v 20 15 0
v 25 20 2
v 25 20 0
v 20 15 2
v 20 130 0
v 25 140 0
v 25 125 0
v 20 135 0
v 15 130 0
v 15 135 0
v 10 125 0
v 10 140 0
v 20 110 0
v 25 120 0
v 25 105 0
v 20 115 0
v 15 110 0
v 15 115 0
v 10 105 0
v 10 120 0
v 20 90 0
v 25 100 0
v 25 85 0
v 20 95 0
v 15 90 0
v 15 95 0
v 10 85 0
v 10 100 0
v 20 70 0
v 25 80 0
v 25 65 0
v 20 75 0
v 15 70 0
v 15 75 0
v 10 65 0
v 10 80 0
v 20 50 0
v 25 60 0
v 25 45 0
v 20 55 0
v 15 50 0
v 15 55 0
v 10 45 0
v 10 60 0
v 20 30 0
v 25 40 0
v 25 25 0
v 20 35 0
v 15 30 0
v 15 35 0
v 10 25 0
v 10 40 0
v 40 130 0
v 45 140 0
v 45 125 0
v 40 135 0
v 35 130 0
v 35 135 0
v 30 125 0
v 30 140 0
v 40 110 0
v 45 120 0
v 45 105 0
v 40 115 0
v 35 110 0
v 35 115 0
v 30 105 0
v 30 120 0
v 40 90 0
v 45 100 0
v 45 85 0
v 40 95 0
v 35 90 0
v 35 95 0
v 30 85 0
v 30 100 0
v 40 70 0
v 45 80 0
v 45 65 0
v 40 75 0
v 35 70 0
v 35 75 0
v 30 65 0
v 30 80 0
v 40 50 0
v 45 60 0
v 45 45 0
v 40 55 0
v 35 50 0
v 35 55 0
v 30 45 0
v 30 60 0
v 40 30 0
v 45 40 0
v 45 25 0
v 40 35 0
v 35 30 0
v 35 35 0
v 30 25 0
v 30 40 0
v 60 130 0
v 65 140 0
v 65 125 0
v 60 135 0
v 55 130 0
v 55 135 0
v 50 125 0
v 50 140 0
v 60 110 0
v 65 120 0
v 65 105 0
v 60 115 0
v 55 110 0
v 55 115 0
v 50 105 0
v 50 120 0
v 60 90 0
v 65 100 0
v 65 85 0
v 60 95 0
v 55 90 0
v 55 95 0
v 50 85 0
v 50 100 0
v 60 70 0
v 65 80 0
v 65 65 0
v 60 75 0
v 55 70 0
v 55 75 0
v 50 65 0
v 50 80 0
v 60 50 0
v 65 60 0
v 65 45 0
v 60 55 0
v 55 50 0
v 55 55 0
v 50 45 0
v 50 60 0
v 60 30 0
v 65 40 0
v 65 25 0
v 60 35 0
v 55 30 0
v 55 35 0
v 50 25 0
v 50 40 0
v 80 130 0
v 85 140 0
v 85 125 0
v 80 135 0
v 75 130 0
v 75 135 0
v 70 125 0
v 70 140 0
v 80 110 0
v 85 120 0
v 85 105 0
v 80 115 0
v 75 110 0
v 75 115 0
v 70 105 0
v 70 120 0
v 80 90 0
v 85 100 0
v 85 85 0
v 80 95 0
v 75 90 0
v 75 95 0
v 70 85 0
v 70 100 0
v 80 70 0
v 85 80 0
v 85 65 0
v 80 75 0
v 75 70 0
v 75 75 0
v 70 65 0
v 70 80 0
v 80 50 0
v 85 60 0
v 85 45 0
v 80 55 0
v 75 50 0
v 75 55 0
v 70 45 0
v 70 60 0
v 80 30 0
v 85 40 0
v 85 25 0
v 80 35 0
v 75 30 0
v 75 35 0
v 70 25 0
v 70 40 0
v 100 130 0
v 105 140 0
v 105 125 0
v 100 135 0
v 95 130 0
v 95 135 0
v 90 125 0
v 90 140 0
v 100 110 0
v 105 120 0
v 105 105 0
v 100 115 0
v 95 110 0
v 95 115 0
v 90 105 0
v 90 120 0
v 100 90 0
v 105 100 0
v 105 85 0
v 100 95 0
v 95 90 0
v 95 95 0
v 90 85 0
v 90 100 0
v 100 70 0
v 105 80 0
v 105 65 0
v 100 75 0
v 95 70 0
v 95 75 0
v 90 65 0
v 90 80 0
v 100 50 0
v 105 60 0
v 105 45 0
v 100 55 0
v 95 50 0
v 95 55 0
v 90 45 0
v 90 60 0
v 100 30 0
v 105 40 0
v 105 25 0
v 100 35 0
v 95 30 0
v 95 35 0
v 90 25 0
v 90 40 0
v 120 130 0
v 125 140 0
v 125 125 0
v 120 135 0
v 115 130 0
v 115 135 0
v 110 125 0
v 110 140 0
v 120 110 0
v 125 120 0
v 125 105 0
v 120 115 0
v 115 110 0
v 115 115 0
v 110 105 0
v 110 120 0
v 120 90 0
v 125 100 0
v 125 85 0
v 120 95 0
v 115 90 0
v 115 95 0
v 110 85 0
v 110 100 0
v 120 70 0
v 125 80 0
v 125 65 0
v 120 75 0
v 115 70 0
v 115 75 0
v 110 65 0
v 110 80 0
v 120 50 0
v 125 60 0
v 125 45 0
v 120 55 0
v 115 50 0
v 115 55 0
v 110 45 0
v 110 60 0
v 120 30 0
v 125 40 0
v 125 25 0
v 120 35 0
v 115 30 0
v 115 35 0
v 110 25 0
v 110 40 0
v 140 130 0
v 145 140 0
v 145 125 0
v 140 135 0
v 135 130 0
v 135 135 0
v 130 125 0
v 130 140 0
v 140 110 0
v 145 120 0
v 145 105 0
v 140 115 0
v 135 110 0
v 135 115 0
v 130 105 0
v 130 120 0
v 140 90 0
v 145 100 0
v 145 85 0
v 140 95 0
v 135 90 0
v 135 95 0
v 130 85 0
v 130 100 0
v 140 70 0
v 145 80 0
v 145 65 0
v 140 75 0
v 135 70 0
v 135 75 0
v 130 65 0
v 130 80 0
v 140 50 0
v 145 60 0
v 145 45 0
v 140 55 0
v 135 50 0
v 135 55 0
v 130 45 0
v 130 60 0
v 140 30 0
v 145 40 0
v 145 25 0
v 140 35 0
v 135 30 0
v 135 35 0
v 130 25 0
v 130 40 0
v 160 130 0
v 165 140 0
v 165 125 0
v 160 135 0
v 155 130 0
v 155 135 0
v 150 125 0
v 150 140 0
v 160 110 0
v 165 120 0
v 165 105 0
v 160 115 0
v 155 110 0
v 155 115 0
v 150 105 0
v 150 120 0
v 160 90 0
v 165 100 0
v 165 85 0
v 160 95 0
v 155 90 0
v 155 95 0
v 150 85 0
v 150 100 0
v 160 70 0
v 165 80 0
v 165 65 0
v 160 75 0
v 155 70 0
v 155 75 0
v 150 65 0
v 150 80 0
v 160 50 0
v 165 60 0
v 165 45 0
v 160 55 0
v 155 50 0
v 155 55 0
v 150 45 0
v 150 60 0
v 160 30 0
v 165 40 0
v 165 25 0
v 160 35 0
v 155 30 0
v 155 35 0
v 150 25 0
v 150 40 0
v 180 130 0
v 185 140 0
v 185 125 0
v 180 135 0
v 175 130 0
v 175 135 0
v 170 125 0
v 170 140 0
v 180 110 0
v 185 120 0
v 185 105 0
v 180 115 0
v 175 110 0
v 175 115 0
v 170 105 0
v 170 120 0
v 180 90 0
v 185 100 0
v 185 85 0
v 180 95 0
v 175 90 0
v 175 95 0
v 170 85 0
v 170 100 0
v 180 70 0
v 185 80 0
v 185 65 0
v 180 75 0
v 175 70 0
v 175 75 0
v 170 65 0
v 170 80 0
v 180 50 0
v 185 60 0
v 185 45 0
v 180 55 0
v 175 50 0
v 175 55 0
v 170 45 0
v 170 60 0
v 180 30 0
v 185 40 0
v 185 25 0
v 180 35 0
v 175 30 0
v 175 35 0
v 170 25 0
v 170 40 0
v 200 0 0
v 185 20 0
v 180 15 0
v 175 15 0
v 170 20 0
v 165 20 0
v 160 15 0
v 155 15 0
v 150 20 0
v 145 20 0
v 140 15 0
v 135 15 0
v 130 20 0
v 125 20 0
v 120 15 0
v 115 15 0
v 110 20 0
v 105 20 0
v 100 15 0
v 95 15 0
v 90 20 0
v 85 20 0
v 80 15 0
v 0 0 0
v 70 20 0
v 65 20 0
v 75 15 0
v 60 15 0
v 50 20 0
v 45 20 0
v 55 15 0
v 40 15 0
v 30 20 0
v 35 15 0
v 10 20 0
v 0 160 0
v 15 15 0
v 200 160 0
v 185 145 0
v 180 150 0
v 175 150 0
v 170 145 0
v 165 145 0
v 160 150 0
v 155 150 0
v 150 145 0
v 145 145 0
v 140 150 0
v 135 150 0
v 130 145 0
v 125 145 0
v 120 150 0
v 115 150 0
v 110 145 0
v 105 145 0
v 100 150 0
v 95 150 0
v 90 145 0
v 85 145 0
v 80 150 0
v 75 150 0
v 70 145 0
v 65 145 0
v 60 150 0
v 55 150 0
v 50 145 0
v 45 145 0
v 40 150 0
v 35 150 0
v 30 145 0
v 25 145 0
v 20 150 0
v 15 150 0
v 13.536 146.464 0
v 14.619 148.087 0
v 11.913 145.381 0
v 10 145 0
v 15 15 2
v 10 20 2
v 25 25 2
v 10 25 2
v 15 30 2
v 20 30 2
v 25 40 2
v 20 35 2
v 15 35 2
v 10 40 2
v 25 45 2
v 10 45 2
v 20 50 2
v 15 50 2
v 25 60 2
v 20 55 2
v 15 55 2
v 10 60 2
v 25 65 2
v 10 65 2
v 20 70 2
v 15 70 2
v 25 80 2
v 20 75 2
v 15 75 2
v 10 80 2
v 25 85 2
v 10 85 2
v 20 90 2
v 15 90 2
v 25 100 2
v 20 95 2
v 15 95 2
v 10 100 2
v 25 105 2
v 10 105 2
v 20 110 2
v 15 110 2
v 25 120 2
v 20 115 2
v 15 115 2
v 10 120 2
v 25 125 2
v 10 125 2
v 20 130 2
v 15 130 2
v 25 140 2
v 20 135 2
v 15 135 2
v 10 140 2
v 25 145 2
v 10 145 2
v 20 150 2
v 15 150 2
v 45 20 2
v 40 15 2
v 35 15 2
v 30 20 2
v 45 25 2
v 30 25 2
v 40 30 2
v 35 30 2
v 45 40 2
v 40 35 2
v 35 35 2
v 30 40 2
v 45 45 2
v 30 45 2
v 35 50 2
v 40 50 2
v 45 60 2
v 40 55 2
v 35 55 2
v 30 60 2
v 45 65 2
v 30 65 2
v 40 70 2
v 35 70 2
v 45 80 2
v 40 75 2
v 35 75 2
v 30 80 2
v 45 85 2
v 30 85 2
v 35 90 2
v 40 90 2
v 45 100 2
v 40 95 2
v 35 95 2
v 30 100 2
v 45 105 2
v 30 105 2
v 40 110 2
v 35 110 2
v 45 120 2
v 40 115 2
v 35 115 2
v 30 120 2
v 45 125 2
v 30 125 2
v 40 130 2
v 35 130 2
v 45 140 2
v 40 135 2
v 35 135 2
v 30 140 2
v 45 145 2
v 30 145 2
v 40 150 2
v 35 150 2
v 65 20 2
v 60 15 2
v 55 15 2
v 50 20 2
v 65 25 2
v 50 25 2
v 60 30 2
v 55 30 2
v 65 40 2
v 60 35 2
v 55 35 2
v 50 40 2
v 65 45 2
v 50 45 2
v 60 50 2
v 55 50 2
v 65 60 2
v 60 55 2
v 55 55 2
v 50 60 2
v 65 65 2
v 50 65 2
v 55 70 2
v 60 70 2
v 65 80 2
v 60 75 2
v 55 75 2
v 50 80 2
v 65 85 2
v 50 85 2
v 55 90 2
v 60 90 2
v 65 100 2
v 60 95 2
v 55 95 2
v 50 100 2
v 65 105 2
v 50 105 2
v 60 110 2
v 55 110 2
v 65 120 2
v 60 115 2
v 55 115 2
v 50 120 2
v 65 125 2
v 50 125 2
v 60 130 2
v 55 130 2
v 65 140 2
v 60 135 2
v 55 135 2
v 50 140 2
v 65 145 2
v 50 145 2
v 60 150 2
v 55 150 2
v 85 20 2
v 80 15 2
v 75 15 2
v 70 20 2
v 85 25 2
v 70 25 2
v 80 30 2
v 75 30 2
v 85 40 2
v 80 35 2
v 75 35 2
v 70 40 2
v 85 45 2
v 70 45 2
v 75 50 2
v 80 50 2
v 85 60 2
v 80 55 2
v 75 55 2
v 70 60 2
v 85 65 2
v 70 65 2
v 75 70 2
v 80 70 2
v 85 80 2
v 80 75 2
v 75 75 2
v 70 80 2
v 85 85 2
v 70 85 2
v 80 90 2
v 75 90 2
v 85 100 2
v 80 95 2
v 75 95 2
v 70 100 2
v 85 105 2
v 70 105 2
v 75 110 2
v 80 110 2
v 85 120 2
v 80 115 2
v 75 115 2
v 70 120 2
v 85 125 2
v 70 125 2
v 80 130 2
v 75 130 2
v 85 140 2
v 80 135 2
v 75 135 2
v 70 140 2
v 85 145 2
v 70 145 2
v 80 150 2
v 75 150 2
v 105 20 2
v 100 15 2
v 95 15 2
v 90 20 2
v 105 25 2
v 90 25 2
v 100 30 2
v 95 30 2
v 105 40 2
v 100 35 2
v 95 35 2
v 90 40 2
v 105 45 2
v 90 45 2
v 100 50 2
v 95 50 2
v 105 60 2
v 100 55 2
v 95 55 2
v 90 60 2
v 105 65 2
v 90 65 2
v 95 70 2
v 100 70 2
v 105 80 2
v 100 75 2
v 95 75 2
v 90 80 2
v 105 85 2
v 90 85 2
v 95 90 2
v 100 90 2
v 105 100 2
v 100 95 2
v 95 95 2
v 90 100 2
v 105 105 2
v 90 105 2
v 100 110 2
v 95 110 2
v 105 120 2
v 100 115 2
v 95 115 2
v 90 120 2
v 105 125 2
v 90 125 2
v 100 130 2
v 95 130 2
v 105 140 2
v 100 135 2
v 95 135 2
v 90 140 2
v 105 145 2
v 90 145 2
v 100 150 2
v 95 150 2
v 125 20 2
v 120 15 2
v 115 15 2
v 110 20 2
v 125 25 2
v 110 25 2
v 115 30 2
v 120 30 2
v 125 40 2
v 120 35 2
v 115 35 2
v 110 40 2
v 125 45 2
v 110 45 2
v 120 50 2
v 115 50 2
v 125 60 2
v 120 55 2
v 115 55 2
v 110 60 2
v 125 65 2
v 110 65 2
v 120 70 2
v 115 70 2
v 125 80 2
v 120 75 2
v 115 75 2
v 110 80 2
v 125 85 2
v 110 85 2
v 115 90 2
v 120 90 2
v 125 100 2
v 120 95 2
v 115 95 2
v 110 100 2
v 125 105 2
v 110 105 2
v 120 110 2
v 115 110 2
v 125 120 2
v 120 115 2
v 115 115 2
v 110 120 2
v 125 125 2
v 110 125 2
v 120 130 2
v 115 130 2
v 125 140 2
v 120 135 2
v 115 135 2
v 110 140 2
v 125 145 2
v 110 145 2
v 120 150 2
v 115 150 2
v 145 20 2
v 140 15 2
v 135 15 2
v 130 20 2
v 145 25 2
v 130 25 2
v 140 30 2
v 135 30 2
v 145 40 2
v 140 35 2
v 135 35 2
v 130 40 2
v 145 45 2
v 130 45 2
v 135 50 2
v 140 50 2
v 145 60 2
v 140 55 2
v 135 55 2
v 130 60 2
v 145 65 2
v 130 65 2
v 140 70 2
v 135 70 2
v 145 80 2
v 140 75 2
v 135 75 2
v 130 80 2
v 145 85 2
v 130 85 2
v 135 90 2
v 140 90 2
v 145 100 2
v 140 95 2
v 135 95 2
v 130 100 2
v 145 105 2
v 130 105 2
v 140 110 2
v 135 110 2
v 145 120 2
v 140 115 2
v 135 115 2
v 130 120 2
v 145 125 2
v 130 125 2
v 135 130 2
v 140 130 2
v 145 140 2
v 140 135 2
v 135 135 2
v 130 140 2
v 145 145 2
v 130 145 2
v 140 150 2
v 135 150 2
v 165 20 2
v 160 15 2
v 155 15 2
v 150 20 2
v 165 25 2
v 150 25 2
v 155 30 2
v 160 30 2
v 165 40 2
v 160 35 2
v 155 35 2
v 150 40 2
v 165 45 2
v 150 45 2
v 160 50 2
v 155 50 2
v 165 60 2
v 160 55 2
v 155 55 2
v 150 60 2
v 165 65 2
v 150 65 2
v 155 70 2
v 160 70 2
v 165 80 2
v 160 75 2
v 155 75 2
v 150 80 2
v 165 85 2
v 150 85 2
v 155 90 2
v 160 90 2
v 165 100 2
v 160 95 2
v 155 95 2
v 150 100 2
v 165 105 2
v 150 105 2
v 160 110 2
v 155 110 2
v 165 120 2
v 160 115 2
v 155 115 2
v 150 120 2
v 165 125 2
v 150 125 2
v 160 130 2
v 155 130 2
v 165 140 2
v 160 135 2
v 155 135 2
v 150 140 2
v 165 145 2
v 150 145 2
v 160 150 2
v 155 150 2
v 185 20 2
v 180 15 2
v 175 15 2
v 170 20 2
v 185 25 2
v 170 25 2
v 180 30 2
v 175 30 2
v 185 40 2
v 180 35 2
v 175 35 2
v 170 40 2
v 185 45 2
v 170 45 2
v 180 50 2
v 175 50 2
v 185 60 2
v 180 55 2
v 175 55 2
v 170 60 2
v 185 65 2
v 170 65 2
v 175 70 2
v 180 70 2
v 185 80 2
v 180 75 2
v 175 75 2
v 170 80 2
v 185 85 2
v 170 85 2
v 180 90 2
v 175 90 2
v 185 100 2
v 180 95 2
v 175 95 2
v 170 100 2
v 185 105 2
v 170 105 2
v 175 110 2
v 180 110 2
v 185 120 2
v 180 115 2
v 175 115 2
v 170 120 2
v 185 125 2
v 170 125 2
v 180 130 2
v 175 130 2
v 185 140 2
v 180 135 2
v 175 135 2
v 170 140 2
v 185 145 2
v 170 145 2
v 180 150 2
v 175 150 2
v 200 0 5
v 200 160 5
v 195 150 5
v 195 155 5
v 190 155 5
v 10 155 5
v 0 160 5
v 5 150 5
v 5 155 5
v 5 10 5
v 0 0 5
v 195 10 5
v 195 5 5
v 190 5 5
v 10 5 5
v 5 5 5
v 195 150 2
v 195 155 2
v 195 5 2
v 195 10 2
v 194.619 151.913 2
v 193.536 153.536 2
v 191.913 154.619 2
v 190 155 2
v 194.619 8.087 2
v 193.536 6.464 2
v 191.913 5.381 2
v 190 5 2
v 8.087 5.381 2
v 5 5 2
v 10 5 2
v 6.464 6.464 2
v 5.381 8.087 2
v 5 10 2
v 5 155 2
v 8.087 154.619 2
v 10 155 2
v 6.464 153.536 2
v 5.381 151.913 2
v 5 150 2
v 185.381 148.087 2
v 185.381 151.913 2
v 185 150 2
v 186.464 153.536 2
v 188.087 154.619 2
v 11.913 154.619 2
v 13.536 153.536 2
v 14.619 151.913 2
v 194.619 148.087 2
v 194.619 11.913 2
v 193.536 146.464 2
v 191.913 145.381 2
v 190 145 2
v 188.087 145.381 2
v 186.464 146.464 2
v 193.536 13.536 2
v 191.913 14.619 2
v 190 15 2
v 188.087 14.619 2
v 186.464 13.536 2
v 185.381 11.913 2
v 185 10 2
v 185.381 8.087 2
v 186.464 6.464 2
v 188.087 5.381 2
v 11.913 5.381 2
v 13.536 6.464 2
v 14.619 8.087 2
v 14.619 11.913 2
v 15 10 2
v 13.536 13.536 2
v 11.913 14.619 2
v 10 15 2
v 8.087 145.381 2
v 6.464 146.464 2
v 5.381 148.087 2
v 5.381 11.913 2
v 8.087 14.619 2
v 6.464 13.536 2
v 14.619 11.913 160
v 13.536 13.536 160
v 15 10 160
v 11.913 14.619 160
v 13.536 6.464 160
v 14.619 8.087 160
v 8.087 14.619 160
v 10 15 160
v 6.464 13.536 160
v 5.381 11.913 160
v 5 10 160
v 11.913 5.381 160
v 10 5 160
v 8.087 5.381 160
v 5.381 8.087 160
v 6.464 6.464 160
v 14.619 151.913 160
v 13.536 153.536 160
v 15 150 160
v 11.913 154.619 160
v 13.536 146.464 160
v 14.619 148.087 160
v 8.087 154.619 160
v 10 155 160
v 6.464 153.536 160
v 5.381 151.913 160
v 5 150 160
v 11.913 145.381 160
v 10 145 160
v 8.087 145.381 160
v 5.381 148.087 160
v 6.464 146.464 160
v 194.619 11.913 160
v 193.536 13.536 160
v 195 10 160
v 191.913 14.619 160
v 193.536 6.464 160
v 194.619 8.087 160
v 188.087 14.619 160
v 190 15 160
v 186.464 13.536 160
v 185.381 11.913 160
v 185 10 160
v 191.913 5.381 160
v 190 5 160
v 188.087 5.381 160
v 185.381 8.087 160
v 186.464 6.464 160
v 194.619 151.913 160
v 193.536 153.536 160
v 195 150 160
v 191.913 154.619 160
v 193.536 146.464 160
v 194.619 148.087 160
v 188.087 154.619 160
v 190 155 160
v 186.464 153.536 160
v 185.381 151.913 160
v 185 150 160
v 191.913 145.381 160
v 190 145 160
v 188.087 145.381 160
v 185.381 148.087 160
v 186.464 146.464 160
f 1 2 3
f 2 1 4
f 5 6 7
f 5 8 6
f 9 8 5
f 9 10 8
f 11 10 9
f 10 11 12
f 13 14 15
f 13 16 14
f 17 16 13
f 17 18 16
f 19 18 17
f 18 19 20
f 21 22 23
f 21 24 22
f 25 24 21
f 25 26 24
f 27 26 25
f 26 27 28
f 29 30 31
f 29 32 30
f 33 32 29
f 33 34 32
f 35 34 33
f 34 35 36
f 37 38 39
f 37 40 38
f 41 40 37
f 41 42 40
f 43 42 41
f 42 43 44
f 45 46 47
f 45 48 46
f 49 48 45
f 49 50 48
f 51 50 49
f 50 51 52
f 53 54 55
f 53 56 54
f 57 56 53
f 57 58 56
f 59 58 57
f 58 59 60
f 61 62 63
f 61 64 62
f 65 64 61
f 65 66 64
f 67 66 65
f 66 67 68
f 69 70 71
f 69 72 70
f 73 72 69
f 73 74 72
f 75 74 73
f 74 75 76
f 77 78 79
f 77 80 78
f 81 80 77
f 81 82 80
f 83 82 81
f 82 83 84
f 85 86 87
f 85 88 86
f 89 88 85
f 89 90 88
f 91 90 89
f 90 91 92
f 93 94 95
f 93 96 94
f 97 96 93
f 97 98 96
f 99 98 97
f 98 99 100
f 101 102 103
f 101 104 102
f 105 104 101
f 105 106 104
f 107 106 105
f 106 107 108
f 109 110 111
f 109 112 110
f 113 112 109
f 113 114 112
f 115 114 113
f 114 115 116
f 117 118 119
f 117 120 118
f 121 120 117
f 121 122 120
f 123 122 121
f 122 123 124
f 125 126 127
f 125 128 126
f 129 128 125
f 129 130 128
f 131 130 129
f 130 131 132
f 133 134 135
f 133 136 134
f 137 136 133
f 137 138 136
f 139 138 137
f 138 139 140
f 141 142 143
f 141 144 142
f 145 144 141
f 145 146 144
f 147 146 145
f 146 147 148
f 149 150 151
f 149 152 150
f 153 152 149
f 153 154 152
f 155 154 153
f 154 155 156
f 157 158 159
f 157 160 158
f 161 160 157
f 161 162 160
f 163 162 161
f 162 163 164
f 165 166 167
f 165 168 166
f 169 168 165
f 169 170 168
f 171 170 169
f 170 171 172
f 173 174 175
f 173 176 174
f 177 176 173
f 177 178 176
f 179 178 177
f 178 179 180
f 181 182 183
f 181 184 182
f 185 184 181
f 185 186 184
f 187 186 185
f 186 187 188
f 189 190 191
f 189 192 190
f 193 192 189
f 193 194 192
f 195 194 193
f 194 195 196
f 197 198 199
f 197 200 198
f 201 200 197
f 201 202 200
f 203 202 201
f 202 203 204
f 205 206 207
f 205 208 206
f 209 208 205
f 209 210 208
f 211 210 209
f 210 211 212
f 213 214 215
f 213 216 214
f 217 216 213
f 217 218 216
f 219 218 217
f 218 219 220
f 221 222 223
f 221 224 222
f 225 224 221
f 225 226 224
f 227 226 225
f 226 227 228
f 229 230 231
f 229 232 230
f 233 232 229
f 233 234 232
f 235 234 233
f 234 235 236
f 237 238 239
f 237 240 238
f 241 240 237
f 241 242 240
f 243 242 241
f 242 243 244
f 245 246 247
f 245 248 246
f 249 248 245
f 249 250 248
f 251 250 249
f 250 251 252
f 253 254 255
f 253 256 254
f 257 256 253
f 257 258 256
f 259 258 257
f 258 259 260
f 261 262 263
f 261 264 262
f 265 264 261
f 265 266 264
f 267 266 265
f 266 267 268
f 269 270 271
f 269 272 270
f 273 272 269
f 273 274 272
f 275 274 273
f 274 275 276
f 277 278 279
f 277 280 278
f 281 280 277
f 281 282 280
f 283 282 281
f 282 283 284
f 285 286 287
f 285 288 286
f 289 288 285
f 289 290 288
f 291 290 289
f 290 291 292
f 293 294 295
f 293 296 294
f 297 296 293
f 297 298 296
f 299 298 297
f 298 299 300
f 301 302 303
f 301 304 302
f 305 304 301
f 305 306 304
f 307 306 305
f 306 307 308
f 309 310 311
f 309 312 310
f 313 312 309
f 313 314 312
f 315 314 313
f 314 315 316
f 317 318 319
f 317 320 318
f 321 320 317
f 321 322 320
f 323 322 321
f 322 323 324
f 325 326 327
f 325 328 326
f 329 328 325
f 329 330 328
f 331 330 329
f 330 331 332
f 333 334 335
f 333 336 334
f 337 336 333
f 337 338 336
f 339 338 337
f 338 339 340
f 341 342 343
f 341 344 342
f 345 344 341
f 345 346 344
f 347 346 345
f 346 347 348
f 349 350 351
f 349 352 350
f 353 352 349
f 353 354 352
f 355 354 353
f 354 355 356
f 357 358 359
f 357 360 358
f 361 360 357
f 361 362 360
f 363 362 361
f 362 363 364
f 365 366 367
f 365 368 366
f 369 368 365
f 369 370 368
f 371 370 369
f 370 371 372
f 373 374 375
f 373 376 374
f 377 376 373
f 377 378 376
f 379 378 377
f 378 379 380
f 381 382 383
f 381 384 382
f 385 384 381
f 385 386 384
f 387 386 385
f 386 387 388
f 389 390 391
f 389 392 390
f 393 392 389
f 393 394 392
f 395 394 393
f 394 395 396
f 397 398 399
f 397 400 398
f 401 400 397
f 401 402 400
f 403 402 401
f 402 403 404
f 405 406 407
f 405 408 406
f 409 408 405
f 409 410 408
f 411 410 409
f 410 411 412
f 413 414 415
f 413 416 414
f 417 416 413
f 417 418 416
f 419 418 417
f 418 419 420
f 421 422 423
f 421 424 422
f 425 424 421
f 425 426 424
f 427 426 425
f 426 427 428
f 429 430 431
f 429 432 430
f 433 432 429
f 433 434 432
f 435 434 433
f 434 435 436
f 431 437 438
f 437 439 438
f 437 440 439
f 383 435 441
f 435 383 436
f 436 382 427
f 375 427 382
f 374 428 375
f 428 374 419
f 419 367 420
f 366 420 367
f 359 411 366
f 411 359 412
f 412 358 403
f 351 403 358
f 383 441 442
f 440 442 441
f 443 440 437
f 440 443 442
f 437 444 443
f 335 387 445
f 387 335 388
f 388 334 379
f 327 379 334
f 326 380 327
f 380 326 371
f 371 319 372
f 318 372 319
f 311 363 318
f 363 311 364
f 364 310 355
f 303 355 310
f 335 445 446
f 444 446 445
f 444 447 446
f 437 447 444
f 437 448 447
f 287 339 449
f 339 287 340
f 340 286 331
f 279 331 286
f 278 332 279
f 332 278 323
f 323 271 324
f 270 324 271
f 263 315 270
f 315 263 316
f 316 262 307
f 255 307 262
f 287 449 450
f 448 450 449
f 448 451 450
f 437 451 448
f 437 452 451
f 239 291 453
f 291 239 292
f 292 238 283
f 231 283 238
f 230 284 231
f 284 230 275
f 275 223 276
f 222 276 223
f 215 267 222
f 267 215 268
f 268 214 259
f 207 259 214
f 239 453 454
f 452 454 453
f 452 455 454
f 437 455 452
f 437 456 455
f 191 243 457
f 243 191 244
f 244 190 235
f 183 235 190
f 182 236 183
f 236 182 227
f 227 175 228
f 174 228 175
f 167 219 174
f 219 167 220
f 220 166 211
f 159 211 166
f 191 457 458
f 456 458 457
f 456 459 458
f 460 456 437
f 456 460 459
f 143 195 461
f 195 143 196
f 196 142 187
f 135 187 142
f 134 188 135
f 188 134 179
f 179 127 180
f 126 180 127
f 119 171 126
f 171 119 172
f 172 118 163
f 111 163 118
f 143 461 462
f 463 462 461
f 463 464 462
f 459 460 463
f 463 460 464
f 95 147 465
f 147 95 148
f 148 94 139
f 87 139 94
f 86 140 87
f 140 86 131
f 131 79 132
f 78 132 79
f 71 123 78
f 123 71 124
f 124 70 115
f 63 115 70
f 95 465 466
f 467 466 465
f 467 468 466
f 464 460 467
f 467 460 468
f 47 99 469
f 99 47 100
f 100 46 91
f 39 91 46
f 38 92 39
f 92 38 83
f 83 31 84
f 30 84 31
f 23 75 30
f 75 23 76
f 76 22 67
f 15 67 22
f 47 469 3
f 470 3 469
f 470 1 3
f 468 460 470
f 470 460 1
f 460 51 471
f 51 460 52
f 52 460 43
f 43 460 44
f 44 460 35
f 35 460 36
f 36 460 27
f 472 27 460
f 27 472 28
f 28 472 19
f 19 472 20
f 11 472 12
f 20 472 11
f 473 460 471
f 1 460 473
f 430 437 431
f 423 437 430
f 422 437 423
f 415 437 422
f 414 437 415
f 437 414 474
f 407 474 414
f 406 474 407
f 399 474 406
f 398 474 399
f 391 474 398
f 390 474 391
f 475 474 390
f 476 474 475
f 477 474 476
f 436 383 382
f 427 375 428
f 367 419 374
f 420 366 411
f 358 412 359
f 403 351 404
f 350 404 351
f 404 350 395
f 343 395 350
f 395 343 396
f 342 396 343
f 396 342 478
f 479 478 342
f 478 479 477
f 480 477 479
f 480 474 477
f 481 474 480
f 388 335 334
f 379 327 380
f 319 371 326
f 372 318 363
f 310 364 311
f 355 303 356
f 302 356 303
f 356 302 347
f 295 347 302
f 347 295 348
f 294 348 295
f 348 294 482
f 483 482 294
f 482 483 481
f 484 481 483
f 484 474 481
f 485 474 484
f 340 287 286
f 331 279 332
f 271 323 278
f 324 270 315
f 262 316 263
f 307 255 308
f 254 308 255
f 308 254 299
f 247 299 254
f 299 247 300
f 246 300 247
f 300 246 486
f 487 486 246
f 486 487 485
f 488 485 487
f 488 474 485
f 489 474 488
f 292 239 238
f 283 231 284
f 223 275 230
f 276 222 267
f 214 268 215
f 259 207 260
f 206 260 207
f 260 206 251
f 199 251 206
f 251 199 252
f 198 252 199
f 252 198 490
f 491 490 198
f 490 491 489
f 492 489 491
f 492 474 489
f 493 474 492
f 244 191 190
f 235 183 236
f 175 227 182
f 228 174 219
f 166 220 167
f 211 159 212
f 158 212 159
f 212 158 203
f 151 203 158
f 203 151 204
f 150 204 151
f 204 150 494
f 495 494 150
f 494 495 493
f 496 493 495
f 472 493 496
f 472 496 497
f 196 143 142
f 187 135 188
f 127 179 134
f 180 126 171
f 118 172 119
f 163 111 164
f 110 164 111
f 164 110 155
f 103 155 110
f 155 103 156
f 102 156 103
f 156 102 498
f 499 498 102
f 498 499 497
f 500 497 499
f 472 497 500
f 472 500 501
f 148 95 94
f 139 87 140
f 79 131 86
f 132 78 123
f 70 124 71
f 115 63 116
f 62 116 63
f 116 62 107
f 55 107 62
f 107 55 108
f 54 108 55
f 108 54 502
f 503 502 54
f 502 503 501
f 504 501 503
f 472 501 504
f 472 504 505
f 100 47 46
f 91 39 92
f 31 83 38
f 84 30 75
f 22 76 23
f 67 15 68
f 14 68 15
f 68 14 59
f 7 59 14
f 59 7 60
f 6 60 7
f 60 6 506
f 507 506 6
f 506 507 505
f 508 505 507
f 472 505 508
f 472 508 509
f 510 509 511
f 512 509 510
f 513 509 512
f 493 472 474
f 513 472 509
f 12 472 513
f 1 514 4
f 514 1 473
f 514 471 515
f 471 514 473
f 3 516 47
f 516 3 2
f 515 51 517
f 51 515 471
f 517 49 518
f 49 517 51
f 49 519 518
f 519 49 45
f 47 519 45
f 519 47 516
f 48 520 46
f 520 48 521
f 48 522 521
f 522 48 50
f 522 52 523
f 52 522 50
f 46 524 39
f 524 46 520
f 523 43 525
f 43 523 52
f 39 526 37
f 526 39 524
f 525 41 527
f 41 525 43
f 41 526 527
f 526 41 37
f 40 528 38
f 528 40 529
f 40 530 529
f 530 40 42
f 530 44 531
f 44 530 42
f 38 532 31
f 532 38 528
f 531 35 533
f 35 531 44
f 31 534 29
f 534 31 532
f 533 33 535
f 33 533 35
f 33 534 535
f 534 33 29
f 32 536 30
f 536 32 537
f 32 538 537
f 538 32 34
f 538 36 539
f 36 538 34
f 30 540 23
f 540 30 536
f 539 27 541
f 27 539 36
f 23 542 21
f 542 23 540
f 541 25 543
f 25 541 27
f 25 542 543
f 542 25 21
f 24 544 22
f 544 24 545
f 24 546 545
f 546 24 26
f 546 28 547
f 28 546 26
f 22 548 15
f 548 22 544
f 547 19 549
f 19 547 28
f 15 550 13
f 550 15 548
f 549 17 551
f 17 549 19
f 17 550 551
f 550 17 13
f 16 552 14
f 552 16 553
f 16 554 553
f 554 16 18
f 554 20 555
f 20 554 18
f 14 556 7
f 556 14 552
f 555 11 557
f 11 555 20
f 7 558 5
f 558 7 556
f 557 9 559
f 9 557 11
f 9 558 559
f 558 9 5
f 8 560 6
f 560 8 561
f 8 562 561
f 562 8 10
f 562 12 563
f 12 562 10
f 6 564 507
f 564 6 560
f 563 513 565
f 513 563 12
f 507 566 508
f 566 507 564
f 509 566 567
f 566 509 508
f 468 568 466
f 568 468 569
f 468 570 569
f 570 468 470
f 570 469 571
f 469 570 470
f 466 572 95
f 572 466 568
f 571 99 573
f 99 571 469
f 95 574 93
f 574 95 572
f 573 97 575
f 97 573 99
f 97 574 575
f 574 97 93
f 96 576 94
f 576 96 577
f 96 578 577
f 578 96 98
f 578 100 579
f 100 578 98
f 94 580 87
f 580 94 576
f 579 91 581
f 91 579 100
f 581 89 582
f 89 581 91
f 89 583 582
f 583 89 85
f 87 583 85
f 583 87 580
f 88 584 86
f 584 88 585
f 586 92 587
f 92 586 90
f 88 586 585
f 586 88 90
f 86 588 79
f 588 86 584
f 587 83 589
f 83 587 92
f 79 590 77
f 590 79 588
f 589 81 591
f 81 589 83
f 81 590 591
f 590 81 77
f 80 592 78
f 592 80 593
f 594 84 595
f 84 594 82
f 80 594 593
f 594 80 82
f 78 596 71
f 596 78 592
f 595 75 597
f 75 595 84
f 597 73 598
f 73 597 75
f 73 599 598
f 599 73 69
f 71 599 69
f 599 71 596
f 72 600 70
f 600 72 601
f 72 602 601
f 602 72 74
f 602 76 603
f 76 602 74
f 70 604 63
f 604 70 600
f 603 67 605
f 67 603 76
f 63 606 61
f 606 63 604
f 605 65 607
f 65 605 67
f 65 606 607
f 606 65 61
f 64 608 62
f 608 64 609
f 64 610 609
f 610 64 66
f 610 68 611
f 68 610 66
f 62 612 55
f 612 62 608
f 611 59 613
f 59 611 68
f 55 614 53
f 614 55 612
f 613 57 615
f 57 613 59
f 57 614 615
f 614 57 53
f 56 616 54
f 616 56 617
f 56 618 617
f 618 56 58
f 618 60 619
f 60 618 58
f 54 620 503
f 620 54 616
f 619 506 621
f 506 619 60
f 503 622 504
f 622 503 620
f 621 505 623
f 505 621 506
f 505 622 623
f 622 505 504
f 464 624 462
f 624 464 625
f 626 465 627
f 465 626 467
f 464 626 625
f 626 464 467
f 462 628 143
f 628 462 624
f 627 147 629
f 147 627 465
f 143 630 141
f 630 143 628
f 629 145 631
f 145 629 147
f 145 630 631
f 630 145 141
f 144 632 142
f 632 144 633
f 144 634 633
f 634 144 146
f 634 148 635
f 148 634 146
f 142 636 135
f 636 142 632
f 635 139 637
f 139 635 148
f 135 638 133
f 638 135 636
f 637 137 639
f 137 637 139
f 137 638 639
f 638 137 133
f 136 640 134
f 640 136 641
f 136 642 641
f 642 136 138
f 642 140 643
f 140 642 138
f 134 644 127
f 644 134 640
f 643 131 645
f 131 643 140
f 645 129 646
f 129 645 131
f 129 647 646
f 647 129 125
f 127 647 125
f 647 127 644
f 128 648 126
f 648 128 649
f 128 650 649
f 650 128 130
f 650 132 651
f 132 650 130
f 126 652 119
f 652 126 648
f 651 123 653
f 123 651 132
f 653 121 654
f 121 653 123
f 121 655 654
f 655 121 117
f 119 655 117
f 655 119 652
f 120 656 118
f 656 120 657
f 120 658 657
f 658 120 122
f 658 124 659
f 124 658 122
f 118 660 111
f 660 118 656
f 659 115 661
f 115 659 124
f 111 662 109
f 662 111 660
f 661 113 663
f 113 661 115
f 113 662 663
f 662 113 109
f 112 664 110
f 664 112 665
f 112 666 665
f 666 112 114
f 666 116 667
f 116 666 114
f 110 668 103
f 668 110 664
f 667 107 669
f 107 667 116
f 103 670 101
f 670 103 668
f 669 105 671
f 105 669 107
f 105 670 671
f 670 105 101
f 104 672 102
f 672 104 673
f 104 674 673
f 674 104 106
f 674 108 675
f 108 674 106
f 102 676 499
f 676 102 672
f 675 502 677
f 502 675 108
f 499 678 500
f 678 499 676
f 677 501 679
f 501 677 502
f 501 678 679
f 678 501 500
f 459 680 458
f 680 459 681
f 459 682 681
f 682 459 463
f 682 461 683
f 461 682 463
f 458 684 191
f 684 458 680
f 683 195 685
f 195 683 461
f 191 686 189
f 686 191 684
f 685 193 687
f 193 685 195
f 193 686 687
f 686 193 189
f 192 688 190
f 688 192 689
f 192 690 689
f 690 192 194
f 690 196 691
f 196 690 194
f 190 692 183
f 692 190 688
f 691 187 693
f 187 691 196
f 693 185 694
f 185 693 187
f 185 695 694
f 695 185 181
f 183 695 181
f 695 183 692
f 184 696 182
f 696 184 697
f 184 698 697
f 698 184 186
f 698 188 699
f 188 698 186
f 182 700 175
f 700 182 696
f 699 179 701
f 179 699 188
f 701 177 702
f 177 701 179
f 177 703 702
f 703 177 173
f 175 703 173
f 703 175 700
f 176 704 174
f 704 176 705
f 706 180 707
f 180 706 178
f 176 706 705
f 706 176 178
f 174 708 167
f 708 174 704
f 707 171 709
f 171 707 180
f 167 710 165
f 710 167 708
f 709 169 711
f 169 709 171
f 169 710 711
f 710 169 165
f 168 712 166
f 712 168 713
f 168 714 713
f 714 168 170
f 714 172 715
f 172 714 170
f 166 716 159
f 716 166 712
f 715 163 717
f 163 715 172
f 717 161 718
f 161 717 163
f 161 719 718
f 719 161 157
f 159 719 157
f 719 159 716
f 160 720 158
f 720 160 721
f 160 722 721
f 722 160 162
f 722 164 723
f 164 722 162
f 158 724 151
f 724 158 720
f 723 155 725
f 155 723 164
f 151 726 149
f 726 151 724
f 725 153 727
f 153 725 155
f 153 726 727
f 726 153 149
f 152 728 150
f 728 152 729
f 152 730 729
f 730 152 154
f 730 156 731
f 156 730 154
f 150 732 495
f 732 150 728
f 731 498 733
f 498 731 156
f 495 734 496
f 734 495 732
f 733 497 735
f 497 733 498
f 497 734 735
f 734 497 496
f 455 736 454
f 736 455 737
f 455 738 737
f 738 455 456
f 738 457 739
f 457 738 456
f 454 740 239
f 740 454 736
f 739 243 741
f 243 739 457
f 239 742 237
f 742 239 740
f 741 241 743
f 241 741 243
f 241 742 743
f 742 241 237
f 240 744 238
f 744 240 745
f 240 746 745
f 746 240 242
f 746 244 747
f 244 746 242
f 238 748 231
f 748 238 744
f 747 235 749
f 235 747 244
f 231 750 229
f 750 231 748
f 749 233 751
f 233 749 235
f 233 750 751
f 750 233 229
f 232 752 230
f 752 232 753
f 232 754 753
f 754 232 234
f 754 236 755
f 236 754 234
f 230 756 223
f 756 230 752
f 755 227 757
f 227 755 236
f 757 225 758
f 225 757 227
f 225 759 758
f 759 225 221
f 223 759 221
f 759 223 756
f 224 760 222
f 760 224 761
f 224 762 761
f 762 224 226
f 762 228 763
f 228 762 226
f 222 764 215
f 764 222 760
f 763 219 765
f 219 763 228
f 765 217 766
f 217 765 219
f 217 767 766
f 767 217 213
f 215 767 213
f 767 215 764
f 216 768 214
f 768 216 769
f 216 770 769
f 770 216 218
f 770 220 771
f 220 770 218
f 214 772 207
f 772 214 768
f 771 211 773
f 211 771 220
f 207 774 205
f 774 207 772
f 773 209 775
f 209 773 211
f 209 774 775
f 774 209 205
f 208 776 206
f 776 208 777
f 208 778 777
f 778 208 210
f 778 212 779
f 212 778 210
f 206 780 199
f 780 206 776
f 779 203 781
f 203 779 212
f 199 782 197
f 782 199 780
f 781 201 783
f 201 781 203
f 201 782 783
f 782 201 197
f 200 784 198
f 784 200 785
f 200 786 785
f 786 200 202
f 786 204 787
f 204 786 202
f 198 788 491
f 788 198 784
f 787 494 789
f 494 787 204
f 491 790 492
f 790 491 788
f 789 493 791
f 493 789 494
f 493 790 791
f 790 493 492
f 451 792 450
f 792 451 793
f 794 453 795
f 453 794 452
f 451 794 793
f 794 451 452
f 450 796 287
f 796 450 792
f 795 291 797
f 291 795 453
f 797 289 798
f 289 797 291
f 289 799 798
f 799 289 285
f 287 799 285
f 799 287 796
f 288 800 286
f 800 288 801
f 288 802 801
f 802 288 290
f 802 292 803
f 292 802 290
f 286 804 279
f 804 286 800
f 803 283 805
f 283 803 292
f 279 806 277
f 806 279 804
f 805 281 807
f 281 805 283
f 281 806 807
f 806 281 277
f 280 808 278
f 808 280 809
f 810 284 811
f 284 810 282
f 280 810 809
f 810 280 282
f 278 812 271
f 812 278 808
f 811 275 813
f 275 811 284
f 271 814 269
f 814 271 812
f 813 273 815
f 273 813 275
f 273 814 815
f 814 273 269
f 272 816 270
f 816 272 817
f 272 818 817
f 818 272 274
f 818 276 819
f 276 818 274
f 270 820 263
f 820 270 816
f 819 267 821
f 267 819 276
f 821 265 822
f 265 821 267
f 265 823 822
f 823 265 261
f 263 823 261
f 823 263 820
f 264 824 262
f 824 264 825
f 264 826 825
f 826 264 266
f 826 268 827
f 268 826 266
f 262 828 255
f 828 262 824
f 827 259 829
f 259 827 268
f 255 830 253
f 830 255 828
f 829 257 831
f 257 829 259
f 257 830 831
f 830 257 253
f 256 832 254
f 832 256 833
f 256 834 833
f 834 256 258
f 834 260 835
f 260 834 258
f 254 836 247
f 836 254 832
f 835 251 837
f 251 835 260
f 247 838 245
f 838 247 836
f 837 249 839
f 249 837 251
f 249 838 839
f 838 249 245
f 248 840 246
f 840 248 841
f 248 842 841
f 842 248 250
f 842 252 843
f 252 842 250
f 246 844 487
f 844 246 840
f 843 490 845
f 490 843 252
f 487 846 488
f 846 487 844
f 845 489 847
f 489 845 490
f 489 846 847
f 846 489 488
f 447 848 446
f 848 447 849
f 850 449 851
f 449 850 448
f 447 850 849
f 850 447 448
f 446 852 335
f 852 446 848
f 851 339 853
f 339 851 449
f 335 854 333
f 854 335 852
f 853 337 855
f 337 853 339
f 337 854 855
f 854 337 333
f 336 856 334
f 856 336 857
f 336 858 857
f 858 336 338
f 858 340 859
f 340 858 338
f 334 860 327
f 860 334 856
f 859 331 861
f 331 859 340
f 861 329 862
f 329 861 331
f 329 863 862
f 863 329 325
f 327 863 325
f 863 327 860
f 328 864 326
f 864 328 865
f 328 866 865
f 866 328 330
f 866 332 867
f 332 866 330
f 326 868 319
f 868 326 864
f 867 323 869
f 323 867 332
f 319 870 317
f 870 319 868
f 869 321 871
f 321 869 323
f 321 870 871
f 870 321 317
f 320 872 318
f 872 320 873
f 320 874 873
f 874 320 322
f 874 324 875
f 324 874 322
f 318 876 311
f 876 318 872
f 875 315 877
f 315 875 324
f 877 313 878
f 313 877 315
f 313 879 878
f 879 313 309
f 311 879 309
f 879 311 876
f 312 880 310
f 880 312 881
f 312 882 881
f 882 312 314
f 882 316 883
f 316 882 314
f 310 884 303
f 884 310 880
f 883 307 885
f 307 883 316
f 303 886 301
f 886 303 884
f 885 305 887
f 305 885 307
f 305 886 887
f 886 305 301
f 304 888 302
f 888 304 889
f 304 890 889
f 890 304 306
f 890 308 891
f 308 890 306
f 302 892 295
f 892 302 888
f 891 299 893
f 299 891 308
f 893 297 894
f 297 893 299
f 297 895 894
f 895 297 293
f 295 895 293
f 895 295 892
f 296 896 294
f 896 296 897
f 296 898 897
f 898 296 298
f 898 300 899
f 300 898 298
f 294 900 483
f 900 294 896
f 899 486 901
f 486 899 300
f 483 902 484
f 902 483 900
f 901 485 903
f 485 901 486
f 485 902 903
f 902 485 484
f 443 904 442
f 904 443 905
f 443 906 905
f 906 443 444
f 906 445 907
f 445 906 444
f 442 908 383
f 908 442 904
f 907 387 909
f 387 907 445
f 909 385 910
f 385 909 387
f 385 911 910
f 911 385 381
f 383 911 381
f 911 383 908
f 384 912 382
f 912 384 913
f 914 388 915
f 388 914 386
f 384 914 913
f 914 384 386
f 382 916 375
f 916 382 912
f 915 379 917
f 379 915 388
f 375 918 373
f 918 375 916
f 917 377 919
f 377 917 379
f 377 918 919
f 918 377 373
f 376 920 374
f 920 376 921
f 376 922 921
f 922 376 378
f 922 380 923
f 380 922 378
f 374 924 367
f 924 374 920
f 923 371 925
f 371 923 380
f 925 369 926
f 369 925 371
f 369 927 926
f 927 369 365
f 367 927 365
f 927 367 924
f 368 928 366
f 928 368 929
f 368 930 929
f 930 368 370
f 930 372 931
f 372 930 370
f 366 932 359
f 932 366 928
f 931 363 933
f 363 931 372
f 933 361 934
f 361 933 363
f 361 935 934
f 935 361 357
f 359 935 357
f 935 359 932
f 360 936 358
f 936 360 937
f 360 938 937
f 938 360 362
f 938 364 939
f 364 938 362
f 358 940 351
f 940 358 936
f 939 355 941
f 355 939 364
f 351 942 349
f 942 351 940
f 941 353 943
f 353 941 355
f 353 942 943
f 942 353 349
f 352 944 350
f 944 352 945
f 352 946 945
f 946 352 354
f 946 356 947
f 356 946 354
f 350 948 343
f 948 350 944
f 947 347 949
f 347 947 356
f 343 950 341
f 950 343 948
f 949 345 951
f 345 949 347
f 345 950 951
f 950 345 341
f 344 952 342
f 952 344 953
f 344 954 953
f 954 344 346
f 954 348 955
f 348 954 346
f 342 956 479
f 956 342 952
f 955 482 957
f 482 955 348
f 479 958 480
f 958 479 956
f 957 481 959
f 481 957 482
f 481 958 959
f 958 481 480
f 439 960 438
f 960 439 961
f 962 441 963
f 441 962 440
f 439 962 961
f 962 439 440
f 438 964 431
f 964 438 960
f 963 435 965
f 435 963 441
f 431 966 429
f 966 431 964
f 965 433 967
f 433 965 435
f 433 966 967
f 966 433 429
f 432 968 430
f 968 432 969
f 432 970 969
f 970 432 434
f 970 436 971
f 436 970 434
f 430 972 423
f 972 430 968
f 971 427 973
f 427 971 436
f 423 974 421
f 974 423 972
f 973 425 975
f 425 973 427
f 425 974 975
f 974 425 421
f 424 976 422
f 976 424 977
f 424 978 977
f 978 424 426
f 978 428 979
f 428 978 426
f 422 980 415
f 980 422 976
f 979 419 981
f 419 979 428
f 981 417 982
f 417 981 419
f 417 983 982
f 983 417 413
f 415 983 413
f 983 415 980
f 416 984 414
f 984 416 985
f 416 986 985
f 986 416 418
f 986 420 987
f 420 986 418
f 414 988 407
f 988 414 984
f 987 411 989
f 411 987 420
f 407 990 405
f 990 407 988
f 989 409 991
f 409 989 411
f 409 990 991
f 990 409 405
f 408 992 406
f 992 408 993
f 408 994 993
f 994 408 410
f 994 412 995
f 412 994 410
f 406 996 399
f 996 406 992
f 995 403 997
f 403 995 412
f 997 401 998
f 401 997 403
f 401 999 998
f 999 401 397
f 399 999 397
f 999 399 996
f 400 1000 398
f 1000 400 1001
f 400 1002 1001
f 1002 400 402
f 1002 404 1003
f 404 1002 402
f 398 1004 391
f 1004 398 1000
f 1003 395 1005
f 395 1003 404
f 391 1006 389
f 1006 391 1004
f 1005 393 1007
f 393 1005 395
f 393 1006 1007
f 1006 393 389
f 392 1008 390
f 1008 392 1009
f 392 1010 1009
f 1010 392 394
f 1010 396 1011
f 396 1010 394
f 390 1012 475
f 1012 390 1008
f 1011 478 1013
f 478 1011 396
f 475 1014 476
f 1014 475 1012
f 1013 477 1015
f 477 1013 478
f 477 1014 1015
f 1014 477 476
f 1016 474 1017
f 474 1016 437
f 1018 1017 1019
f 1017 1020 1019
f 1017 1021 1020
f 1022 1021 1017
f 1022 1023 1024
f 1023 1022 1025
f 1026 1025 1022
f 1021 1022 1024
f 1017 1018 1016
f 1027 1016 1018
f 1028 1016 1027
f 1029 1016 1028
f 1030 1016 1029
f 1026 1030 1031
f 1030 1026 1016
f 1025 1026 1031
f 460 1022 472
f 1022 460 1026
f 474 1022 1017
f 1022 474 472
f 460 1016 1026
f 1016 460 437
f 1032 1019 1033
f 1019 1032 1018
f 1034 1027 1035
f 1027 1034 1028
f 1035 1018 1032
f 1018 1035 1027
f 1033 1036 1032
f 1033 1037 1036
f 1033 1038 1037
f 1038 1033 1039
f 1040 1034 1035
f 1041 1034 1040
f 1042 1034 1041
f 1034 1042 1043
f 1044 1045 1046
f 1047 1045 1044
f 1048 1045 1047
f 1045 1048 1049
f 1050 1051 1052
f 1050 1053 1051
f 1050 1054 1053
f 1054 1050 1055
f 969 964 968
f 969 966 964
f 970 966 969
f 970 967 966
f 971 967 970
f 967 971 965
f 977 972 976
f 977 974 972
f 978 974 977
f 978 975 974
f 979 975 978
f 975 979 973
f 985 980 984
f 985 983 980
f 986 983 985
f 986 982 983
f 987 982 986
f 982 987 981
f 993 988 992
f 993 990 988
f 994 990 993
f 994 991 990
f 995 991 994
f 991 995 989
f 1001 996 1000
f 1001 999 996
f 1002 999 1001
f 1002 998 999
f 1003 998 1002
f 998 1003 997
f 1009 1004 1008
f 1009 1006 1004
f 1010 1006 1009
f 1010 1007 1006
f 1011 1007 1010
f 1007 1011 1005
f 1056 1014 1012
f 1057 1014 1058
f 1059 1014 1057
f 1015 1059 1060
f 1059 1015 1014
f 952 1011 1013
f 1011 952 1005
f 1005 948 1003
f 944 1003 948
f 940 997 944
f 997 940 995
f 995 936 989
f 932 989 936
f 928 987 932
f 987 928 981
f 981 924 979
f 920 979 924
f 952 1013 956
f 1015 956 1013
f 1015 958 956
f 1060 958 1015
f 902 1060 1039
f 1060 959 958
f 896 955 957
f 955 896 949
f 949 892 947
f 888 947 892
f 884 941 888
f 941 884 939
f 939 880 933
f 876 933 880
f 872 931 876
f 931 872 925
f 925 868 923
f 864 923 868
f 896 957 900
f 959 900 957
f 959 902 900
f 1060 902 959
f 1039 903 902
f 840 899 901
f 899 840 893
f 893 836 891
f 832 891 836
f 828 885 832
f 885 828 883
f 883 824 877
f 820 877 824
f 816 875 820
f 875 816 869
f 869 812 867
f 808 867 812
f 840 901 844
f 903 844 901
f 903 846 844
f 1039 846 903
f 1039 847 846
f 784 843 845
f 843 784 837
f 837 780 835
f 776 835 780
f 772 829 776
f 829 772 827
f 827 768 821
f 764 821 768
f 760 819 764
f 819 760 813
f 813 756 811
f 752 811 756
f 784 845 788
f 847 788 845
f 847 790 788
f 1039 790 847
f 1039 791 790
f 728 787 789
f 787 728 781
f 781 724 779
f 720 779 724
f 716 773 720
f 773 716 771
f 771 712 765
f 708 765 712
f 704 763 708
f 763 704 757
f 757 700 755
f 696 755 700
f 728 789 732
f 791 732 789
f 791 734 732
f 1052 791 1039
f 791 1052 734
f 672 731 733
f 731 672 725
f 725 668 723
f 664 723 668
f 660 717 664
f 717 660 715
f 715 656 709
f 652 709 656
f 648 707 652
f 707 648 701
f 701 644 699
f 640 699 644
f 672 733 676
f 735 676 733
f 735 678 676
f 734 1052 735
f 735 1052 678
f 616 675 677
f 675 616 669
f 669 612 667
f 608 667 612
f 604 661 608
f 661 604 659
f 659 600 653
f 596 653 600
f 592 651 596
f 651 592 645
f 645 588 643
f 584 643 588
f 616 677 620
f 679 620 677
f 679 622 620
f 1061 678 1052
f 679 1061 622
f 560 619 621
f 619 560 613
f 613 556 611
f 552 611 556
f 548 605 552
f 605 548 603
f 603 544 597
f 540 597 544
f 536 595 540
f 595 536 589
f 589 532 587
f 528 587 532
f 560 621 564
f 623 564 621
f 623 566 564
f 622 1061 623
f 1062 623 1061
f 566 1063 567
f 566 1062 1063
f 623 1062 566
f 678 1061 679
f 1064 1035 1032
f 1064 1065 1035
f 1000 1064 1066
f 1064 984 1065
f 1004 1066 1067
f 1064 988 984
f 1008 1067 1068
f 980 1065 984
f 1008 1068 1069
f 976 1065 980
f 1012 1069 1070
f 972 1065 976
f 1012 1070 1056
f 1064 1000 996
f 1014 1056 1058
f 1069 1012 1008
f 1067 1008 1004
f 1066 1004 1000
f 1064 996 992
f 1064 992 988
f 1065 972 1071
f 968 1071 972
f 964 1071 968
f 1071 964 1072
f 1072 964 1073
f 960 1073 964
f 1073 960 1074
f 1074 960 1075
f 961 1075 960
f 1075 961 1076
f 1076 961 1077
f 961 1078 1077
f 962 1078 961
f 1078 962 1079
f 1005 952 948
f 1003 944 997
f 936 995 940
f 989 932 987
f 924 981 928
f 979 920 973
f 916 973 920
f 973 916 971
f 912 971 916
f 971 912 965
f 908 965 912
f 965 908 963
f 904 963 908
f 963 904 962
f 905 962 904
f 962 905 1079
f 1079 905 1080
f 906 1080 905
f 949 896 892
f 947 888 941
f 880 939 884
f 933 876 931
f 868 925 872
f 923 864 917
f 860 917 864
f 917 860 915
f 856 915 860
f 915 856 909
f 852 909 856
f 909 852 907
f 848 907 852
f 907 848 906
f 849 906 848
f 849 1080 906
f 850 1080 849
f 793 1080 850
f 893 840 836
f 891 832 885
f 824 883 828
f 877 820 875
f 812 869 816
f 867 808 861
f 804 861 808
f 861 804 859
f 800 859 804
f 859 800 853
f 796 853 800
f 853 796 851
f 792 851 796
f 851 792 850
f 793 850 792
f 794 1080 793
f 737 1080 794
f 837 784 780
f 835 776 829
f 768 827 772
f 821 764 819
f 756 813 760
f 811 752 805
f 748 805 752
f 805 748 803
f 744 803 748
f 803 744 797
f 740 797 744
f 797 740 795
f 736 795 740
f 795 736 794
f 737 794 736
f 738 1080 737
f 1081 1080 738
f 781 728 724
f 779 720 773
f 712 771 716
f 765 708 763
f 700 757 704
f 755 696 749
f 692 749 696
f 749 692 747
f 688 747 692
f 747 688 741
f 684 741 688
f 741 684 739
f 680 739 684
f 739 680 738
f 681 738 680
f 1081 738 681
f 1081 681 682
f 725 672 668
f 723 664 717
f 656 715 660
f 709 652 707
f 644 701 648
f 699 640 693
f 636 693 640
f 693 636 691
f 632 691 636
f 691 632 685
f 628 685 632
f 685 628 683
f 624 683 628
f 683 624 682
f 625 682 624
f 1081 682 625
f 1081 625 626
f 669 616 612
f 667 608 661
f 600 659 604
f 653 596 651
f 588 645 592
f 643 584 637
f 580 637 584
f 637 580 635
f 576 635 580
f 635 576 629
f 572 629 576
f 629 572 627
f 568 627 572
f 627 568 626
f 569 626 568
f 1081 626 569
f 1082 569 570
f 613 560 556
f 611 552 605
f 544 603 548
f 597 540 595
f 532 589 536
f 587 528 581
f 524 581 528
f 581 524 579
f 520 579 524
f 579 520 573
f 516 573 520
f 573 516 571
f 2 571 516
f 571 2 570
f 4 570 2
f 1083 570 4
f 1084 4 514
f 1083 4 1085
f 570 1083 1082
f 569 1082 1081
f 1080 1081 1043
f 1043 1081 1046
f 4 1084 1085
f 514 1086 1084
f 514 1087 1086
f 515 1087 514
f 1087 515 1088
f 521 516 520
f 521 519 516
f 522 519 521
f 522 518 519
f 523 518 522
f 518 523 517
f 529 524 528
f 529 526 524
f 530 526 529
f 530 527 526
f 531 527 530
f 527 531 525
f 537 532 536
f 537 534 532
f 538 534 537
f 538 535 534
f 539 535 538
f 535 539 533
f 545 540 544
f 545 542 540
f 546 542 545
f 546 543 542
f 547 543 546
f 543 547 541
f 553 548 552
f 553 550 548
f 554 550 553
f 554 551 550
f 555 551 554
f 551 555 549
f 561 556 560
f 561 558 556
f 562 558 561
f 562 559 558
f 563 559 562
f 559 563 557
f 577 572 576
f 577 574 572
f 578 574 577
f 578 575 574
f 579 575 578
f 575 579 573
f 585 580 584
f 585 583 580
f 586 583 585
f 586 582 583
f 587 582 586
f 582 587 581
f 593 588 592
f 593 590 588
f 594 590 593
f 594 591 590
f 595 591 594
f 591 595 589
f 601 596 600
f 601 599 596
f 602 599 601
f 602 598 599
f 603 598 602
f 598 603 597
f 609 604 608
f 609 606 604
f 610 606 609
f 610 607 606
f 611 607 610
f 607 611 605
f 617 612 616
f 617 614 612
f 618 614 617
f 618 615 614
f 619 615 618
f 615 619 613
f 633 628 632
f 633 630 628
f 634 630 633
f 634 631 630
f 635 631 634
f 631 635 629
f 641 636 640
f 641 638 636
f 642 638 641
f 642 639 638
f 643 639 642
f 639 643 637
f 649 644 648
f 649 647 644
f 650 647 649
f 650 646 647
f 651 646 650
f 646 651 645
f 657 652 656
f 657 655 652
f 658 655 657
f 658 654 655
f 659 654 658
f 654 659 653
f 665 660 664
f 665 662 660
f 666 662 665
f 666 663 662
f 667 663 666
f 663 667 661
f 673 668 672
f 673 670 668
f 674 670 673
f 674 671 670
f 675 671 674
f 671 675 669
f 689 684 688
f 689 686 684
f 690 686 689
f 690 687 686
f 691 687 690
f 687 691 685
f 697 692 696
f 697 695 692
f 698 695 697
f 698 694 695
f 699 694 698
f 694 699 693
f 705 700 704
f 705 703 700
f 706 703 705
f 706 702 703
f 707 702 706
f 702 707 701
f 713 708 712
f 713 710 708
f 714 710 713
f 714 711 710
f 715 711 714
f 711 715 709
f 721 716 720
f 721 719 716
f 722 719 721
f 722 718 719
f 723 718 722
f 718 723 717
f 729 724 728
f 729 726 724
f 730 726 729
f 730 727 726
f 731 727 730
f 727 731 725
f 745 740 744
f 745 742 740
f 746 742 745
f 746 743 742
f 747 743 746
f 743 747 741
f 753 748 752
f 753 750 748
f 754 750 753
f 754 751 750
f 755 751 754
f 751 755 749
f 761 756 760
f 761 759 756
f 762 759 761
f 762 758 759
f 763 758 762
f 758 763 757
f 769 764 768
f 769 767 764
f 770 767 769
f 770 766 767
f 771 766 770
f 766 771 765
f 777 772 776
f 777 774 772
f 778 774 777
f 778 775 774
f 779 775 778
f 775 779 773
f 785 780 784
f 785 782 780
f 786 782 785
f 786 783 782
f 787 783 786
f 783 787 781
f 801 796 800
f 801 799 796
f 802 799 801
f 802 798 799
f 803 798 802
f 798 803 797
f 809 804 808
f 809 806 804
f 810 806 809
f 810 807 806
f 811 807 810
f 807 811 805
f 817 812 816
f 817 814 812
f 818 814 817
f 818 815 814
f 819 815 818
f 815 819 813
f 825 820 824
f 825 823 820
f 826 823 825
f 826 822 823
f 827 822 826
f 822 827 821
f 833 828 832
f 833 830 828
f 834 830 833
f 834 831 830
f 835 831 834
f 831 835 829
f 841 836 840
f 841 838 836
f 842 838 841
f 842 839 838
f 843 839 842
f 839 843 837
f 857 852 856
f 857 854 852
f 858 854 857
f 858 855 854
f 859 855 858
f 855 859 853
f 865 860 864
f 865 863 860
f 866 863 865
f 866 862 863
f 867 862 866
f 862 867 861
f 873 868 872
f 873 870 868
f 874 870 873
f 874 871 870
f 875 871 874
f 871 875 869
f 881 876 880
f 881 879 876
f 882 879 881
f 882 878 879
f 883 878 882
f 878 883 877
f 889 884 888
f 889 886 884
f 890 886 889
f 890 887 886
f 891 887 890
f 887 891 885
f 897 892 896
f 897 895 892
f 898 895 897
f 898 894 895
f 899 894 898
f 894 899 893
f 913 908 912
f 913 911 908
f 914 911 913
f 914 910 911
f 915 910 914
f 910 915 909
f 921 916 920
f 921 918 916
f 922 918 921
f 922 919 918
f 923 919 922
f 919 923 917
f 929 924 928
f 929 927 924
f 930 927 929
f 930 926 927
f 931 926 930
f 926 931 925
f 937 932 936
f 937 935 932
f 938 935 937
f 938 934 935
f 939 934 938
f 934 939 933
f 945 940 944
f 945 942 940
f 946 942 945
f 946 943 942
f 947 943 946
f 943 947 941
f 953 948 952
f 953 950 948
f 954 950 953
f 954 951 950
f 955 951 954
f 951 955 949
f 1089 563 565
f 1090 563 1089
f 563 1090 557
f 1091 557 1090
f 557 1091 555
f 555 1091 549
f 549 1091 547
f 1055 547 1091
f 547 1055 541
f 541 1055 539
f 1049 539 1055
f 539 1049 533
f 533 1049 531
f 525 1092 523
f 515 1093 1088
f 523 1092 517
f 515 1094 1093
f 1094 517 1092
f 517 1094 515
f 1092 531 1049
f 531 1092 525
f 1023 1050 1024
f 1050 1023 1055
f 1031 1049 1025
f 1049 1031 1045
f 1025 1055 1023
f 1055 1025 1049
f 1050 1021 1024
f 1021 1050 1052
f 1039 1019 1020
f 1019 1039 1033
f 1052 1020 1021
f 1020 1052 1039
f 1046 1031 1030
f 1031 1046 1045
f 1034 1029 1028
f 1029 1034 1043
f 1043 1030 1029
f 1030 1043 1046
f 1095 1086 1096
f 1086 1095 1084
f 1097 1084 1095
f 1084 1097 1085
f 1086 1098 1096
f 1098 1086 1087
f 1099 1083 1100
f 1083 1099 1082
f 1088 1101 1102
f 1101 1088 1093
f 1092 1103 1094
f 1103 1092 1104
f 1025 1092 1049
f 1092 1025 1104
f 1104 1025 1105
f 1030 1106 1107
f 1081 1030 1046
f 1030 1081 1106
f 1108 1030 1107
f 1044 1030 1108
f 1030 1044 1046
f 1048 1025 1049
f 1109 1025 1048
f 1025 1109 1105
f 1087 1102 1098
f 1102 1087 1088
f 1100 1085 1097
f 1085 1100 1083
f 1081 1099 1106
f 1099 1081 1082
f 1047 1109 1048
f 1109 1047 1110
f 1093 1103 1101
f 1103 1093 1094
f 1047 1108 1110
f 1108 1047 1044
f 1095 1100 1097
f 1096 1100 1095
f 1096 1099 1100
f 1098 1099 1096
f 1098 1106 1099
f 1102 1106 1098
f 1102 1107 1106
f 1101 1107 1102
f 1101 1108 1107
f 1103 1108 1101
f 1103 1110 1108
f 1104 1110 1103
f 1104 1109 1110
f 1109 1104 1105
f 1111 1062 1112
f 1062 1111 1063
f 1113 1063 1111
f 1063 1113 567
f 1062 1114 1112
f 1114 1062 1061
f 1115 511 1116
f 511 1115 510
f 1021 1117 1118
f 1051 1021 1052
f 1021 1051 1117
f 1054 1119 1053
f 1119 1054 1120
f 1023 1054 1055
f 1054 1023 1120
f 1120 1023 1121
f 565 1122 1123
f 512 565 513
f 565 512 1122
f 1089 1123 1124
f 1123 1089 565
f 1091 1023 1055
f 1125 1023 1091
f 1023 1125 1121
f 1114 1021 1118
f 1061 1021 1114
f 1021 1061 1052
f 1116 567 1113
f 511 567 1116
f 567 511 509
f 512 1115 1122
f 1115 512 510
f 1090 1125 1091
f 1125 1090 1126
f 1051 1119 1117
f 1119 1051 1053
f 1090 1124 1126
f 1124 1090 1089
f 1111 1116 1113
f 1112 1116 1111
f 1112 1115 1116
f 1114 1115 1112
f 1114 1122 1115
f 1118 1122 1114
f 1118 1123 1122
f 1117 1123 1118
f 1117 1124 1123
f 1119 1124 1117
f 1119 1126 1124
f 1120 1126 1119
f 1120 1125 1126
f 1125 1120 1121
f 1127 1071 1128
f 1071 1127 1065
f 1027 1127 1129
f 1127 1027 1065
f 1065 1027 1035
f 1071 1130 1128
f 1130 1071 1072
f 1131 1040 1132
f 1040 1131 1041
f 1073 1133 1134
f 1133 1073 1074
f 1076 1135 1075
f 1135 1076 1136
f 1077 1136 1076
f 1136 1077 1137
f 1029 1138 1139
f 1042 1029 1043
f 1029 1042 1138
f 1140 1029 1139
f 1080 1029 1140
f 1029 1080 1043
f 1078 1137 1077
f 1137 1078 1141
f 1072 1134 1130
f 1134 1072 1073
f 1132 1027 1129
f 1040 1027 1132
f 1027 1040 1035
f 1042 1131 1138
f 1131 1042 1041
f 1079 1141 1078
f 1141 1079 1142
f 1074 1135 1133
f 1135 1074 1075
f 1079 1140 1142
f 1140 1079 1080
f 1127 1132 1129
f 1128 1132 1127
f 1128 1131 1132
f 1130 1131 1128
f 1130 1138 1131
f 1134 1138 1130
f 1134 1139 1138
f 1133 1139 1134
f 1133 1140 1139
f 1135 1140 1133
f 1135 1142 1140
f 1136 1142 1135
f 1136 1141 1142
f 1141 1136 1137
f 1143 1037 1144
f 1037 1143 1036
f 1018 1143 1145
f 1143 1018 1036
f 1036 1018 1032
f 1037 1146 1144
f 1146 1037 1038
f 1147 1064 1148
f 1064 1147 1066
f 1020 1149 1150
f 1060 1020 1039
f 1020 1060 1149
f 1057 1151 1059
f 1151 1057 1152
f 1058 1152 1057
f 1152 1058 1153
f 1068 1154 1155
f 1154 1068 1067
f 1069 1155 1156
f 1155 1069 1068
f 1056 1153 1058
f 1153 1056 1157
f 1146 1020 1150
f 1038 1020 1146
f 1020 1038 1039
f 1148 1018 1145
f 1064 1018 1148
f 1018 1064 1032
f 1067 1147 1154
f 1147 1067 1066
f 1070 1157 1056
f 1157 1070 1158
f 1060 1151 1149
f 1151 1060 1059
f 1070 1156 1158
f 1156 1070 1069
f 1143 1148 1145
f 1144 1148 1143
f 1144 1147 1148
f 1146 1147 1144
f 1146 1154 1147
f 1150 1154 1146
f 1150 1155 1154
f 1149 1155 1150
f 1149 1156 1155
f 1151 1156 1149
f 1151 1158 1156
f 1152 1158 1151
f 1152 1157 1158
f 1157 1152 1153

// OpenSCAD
//$fn=360;
difference () {
  cube([200,160,5]);
  translate([5,5,2])
  cube([200-10,160-10,3]);  
  for ( x1 = [10,30,50,70,90,110,130,150,170])
        for ( y1 = [10,30,50,70,90,110,130]) {
            translate([x1,y1,0])
            linear_extrude(height = 5)
            polygon([[5,5],[10,5],[15,10],[10,10],[0,10]]);
            translate([x1,y1+5,0])
            linear_extrude(height = 5)
            polygon([[0,5],[15,5],[15,10],[5,10],[0,10]]);
            translate([x1,y1+5,0])
            linear_extrude(height = 5)
            polygon([[0,10],[5,15],[10,15],[15,10]]);
        }
}
for ( x2 = [10,190]) {
  for ( y2 = [10,150]) {
    translate([x2,y2,0])
    cylinder(h=160,d=10);
  }
}
